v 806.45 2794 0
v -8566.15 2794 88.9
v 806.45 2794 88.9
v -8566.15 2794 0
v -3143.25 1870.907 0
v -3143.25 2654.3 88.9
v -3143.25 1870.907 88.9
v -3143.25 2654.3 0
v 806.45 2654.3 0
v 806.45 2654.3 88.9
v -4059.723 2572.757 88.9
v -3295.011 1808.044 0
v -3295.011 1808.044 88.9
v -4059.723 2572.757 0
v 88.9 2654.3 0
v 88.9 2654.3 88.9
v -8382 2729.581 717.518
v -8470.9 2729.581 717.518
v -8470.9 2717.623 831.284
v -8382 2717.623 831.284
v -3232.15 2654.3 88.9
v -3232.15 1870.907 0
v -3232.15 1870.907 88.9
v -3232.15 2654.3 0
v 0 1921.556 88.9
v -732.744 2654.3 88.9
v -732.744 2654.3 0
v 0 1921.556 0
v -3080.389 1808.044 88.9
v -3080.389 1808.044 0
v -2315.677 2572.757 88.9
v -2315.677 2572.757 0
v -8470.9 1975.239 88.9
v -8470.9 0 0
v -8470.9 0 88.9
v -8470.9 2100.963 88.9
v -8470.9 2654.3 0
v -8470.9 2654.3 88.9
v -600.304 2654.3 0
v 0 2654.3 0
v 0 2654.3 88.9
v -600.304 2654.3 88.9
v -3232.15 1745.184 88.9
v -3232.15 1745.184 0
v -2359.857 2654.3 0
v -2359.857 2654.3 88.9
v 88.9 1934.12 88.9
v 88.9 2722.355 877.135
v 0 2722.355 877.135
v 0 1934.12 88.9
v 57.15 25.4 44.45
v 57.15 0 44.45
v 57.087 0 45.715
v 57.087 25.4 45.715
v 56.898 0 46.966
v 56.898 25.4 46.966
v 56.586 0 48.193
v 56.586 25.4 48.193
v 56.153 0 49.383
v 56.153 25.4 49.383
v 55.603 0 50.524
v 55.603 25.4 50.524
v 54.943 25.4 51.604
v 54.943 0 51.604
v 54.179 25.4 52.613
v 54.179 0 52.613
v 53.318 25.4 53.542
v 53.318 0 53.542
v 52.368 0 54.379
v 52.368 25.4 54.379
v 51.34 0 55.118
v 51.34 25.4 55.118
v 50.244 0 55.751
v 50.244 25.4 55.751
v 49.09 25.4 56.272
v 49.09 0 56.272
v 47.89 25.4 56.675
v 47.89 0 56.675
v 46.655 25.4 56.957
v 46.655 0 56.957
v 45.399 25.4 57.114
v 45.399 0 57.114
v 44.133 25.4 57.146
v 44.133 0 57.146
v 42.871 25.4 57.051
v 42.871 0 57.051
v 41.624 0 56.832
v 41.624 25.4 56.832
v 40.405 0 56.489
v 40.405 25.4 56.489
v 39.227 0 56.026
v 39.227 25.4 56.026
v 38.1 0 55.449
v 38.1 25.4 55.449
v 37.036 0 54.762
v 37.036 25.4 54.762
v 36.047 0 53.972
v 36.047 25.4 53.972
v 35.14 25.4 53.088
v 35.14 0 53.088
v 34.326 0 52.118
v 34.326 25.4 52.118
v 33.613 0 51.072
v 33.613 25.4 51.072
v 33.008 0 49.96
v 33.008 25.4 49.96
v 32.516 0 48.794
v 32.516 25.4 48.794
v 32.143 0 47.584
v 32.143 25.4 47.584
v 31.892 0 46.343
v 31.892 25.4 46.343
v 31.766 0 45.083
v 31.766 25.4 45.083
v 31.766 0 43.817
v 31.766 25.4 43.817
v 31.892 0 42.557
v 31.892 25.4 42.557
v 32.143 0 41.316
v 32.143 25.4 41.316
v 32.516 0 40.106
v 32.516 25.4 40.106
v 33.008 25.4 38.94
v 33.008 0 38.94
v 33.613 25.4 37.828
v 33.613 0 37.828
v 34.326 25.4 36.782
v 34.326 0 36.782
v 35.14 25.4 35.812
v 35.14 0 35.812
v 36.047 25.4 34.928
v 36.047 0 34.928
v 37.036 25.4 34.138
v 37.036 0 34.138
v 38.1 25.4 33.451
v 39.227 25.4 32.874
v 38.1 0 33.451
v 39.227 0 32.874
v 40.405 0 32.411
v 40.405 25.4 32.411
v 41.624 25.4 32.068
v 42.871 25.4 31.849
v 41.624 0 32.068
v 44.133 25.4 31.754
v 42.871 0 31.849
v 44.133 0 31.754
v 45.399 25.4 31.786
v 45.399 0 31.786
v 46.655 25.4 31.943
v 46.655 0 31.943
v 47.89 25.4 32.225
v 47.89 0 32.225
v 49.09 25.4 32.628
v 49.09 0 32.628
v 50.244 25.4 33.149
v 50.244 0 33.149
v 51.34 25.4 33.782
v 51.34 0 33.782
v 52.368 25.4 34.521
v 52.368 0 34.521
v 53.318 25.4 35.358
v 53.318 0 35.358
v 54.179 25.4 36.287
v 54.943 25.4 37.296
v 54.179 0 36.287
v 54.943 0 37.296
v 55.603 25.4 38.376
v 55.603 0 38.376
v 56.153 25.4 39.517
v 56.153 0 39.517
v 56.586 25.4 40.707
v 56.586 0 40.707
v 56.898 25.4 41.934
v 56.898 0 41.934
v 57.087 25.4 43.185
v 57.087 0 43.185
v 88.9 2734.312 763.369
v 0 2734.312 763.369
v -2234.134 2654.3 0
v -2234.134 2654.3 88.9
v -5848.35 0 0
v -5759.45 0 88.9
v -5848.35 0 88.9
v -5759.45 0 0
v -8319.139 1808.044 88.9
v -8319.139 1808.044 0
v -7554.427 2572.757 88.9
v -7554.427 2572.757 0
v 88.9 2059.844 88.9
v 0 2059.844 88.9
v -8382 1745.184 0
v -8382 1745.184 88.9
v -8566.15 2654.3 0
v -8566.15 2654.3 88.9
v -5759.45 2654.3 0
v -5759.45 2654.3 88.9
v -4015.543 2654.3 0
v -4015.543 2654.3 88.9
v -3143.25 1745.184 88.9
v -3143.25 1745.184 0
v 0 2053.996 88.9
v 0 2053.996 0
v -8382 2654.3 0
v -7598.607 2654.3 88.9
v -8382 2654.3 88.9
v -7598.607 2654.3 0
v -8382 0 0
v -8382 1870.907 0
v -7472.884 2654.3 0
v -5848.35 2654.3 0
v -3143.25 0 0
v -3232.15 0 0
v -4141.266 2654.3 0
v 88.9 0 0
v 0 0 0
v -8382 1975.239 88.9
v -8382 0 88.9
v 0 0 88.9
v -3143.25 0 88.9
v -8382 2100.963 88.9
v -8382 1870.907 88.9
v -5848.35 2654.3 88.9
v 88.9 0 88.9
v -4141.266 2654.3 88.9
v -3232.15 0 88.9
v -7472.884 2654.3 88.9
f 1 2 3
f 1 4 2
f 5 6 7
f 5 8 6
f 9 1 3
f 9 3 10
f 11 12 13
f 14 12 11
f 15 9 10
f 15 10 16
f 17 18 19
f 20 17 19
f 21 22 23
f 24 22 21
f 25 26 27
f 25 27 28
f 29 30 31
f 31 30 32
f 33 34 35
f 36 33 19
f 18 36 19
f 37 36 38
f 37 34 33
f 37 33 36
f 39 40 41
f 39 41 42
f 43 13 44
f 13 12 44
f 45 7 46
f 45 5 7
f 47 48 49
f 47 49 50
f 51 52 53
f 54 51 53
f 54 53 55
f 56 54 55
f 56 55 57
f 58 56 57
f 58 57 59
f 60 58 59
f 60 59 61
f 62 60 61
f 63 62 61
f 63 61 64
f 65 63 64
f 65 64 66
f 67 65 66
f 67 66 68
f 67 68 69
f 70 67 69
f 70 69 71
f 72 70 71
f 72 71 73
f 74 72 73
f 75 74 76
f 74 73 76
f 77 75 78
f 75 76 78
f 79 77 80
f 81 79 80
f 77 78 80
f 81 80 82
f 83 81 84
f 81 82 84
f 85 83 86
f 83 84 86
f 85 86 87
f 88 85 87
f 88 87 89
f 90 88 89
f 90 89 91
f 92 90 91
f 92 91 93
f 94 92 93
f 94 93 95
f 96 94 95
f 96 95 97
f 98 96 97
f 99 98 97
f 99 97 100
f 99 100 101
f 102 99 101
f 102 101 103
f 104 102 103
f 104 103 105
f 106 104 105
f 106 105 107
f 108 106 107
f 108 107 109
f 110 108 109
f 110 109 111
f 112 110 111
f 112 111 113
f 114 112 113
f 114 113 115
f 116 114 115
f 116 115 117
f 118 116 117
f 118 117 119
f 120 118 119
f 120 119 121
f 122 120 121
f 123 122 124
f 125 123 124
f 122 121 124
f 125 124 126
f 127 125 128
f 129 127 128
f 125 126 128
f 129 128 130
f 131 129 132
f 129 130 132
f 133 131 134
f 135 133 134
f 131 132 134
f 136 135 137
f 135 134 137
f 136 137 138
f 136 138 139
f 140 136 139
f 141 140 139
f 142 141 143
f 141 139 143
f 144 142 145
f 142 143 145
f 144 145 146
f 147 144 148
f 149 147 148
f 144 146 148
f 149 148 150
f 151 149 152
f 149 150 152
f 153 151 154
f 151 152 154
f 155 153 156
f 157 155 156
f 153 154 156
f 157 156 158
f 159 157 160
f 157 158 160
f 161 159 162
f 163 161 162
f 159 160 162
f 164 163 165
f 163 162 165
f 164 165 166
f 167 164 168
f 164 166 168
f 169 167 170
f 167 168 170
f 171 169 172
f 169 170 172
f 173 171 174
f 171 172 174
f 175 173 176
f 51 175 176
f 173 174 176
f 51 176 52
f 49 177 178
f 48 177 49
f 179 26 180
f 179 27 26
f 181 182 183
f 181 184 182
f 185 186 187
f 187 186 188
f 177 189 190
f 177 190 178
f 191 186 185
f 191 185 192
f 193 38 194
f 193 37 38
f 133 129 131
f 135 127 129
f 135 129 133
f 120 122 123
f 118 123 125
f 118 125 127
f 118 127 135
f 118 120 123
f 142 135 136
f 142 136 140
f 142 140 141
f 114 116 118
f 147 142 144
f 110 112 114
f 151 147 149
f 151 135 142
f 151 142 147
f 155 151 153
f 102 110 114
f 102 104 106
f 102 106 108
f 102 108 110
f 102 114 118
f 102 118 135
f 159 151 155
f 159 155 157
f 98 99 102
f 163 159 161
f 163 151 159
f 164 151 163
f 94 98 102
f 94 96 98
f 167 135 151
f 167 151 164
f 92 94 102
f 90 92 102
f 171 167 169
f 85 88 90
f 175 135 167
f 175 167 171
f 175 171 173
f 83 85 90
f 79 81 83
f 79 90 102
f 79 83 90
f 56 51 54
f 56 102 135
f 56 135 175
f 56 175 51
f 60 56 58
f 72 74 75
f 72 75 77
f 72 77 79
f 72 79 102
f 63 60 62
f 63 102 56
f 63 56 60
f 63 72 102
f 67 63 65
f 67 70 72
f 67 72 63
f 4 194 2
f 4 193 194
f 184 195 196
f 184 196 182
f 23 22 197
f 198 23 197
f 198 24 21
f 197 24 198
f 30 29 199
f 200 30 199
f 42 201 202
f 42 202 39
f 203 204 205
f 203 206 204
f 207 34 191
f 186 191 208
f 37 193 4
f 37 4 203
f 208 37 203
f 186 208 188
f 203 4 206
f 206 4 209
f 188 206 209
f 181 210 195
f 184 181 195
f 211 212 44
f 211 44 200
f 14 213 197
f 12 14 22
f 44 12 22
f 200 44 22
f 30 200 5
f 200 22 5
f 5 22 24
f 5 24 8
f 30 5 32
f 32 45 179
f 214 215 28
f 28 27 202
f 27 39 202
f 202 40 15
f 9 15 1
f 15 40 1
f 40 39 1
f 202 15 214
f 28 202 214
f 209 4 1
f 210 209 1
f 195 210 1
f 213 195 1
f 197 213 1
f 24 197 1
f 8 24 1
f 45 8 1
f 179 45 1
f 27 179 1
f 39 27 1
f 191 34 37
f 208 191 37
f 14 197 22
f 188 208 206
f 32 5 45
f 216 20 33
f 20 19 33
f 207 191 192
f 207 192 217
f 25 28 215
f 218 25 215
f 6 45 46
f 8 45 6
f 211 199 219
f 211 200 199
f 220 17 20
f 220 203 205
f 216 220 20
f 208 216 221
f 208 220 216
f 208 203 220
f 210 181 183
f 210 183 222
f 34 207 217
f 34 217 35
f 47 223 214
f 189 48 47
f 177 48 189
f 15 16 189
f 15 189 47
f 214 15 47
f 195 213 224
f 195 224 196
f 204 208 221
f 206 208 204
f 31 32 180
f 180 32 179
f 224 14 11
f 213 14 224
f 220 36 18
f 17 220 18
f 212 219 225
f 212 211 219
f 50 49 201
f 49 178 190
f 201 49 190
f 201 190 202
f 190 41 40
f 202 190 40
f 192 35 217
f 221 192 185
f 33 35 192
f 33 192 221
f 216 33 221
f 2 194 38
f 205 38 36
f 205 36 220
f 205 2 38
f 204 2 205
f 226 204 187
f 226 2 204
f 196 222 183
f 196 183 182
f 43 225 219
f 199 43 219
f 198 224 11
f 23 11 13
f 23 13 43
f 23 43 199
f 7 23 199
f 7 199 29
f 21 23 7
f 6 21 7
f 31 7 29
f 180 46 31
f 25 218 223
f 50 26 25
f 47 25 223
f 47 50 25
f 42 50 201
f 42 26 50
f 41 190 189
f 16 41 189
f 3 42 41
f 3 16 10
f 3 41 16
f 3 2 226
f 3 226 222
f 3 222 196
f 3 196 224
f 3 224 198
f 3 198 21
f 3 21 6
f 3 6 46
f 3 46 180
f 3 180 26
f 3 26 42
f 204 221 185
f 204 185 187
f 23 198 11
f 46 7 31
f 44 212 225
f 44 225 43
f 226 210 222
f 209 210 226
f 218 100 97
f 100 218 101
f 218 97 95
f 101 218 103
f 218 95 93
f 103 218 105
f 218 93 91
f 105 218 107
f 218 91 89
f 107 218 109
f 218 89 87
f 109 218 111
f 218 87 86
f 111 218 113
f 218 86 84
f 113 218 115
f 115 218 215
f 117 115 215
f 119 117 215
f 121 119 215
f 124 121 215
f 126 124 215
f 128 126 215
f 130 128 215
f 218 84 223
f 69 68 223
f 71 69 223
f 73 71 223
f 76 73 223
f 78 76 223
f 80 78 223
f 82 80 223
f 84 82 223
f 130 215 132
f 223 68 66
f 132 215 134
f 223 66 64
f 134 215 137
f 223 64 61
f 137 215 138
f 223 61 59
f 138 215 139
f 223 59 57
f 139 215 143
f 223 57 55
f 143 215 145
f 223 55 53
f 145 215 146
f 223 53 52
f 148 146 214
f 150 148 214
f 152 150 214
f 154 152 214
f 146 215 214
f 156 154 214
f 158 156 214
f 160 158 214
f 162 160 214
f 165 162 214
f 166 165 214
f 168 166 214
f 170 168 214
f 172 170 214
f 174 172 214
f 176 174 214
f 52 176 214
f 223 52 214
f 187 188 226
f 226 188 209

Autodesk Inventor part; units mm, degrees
ref_plane "YZ Plane" through (0, 0, 0) normal (1, 0, 0) x (0, 1, 0)
ref_plane "XZ Plane" through (0, 0, 0) normal (0, 1, 0) x (-1, 0, 0)
ref_plane "XY Plane" through (0, 0, 0) normal (0, 0, 1) x (1, 0, 0)
sketch "Sketch1" plane through (0, 0, 0) normal (0, 0, 1) x (1, 0, 0)
  line L0 (0, 0) -> (88.9, 0)
  line L1 (88.9, 0) -> (88.9, 2654.3)
  line L2 (88.9, 2654.3) -> (0, 2654.3)
  line L3 (0, 2654.3) -> (0, 0)
  line L4 (44.45, 2654.3) -> (806.45, 2654.3) construction
  line L5 (806.45, 2654.3) -> (-8566.15, 2654.3)
  line L6 (-8566.15, 2654.3) -> (-8566.15, 2794)
  line L7 (-8566.15, 2794) -> (806.45, 2794)
  line L8 (806.45, 2794) -> (806.45, 2654.3)
  line L9 (-3143.25, 0) -> (-3232.15, 0)
  line L10 (-3232.15, 0) -> (-3232.15, 2654.3)
  line L11 (-3232.15, 2654.3) -> (-3143.25, 2654.3)
  line L12 (-3143.25, 2654.3) -> (-3143.25, 0)
  line L13 (-5759.45, 0) -> (-5848.35, 0)
  line L14 (-5848.35, 0) -> (-5848.35, 2654.3)
  line L15 (-5848.35, 2654.3) -> (-5759.45, 2654.3)
  line L16 (-5759.45, 2654.3) -> (-5759.45, 0)
  line L17 (-8382, 0) -> (-8470.9, 0)
  line L18 (-8470.9, 0) -> (-8470.9, 2654.3)
  line L19 (-8470.9, 2654.3) -> (-8382, 2654.3)
  line L20 (-8382, 2654.3) -> (-8382, 0)
  line L21 (0, 1892.3) -> (-764.7126, 2657.0126)
  line L22 (0, 1892.3) -> (1081.4669, 1892.3) construction
  line L23 (-62.8618, 1829.4382) -> (-827.5744, 2594.1508)
  line L24 (-827.5744, 2594.1508) -> (-887.7236, 2654.3)
  line L25 (-62.8618, 1829.4382) -> (0, 1766.5764)
  line L26 (-3232.15, 1870.9072) -> (-3996.8615, 2635.6187)
  line L27 (-3295.0107, 1808.0443) -> (-4059.7233, 2572.7569)
  line L28 (-3295.0107, 1808.0443) -> (-3232.15, 1745.1837)
  line L29 (-4059.7233, 2572.7569) -> (-4141.2663, 2654.3)
  line L30 (-3996.8615, 2635.6187) -> (-4015.5428, 2654.3)
  line L31 (-3187.7, 2654.3) -> (-3187.7, 0) construction
  line L32 (-3232.15, 1745.1837) -> (-3232.15, 1870.9072)
  line L33 (-4141.2663, 2654.3) -> (-4015.5428, 2654.3)
  line L34 (-3143.25, 1870.9072) -> (-2378.5385, 2635.6187)
  line L35 (-3080.3893, 1808.0443) -> (-2315.6767, 2572.7569)
  line L36 (-3080.3893, 1808.0443) -> (-3143.25, 1745.1837)
  line L37 (-2315.6767, 2572.7569) -> (-2234.1337, 2654.3)
  line L38 (-2378.5385, 2635.6187) -> (-2359.8572, 2654.3)
  line L39 (-3143.25, 1745.1837) -> (-3143.25, 1870.9072)
  line L40 (-2234.1337, 2654.3) -> (-2359.8572, 2654.3)
  line L41 (-7554.4267, 2572.7569) -> (-7472.8837, 2654.3)
  line L42 (-7617.2885, 2635.6187) -> (-7598.6072, 2654.3)
  line L43 (-8382, 1870.9072) -> (-7617.2885, 2635.6187)
  line L44 (-8319.1393, 1808.0443) -> (-7554.4267, 2572.7569)
  line L45 (-8319.1393, 1808.0443) -> (-8382, 1745.1837)
  line L46 (-8382, 1745.1837) -> (-8382, 1870.9072)
  dimension "d0" = 88.9
  dimension "d1" = 2654.3
  dimension "d2" = 762
  dimension "d3" = 9372.6
  dimension "d4" = 139.7
  dimension "d5" = 88.9
  dimension "d6" = 3232.15
  dimension "d7" = 88.9
  dimension "d8" = 2616.2
  dimension "d9" = 88.9
  dimension "d10" = 2622.55
  dimension "d11" = 135
  dimension "d12" = 762
  dimension "d13" = 88.9
  dimension "d14" = 88.9
extrude "Extrusion1" add sketch "Sketch1" along normal blind 88.9 contours L3 L2 L1 L0 | L2 L5 L6 L7 L8 | L37 L35 L36 L12 L34 L38 L5 | L5 L20 L17 L18 | L12 L9 L10 L5 | L5 L41 L44 L45 L20 L43 L42 | L30 L26 L10 L28 L27 L29 L5 | L5 L16 L13 L14
sketch "Sketch2" plane through (0, 0, 88.9) normal (0, 0, 1) x (1, 0, 0)
  line L0 (-2234.1337, 2654.3) -> (0, 2654.3) projected
  line L1 (0, 2654.3) -> (0, 0) projected
  line L2 (0, 2053.9959) -> (-600.3041, 2654.3)
  line L3 (0, 2053.9959) -> (848.9582, 2053.9959) construction
  line L4 (-666.5241, 2588.0801) -> (-38.7907, 1960.3467)
  line L5 (-38.7907, 1960.3467) -> (0, 1921.556)
  line L6 (-666.5241, 2588.0801) -> (-732.744, 2654.3)
  dimension "d17" = 135
extrude "Extrusion2" add sketch "Sketch2" against normal blind 88.9 contours L0 L2 L1 L5 L4 L6
sketch "Sketch3" plane through (0, 0, 0) normal (0, -1, 0) x (1, 0, 0)
  circle A0 centre (44.45, 44.45) radius 12.7
  dimension "d20" = 25.4
extrude "Extrusion3" cut sketch "Sketch3" against normal blind 25.4
sketch "Sketch4" plane through (88.9, 0, 0) normal (1, 0, 0) x (0, 0, -1)
  line L0 (-88.9, 0) -> (-88.9, 2654.3) projected
  line L1 (-88.9, 2059.8437) -> (-763.3688, 2734.3125)
  line L2 (-88.9, 2059.8437) -> (1181.1, 2059.8437) construction
  line L3 (-877.1351, 2722.3552) -> (-111.7219, 1956.942)
  line L4 (-111.7219, 1956.942) -> (-88.9, 1934.1201)
  line L5 (-1112.6492, 2957.8693) -> (-986.9256, 2957.8693)
  line L6 (-88.9, 2059.8437) -> (-88.9, 1934.1201)
  line L7 (-763.3688, 2734.3125) -> (-877.1351, 2722.3552)
  line L8 (-840.5667, 2926.4384) -> (-285.5134, 2926.4384) construction
  line L9 (-88.9, 2147.6306) -> (-717.5179, 2776.2485) construction
  line L10 (-88.9, 2147.6306) -> (800.1, 2147.6306) construction
  point P0 (-1081.2183, 2926.4384)
  dimension "d23" = 1270
  dimension "d24" = 135
  dimension "d25" = 88.9
  dimension "d34" = 174
  dimension "d35" = 889
  dimension "d36" = 135
extrude "Extrusion4" add sketch "Sketch4" against normal blind 88.9
sketch "Sketch5" plane through (-8470.9, 0, 0) normal (-1, 0, 0) x (0, 0, 1)
  line L0 (88.9, 2654.3) -> (88.9, 0) projected
  line L1 (88.9, 2100.9628) -> (717.5179, 2729.5808)
  line L2 (88.9, 2100.9628) -> (977.9, 2100.9628) construction
  line L3 (831.2842, 2717.6234) -> (293.7757, 2180.1149)
  line L4 (293.7757, 2180.1149) -> (88.9, 1975.2392)
  line L5 (717.5179, 2729.5808) -> (843.2415, 2729.5808)
  line L6 (88.9, 1975.2392) -> (88.9, 2100.9628)
  line L7 (717.5179, 2729.5808) -> (831.2842, 2717.6234)
  line L8 (843.2415, 2729.5808) -> (937.1256, 2729.5808) construction
  dimension "d28" = 889
  dimension "d29" = 45
  dimension "d30" = 88.9
  dimension "d33" = 6
extrude "Extrusion5" add sketch "Sketch5" against normal blind 88.9
properties part number "highSide" material "Wood (Birch)"
